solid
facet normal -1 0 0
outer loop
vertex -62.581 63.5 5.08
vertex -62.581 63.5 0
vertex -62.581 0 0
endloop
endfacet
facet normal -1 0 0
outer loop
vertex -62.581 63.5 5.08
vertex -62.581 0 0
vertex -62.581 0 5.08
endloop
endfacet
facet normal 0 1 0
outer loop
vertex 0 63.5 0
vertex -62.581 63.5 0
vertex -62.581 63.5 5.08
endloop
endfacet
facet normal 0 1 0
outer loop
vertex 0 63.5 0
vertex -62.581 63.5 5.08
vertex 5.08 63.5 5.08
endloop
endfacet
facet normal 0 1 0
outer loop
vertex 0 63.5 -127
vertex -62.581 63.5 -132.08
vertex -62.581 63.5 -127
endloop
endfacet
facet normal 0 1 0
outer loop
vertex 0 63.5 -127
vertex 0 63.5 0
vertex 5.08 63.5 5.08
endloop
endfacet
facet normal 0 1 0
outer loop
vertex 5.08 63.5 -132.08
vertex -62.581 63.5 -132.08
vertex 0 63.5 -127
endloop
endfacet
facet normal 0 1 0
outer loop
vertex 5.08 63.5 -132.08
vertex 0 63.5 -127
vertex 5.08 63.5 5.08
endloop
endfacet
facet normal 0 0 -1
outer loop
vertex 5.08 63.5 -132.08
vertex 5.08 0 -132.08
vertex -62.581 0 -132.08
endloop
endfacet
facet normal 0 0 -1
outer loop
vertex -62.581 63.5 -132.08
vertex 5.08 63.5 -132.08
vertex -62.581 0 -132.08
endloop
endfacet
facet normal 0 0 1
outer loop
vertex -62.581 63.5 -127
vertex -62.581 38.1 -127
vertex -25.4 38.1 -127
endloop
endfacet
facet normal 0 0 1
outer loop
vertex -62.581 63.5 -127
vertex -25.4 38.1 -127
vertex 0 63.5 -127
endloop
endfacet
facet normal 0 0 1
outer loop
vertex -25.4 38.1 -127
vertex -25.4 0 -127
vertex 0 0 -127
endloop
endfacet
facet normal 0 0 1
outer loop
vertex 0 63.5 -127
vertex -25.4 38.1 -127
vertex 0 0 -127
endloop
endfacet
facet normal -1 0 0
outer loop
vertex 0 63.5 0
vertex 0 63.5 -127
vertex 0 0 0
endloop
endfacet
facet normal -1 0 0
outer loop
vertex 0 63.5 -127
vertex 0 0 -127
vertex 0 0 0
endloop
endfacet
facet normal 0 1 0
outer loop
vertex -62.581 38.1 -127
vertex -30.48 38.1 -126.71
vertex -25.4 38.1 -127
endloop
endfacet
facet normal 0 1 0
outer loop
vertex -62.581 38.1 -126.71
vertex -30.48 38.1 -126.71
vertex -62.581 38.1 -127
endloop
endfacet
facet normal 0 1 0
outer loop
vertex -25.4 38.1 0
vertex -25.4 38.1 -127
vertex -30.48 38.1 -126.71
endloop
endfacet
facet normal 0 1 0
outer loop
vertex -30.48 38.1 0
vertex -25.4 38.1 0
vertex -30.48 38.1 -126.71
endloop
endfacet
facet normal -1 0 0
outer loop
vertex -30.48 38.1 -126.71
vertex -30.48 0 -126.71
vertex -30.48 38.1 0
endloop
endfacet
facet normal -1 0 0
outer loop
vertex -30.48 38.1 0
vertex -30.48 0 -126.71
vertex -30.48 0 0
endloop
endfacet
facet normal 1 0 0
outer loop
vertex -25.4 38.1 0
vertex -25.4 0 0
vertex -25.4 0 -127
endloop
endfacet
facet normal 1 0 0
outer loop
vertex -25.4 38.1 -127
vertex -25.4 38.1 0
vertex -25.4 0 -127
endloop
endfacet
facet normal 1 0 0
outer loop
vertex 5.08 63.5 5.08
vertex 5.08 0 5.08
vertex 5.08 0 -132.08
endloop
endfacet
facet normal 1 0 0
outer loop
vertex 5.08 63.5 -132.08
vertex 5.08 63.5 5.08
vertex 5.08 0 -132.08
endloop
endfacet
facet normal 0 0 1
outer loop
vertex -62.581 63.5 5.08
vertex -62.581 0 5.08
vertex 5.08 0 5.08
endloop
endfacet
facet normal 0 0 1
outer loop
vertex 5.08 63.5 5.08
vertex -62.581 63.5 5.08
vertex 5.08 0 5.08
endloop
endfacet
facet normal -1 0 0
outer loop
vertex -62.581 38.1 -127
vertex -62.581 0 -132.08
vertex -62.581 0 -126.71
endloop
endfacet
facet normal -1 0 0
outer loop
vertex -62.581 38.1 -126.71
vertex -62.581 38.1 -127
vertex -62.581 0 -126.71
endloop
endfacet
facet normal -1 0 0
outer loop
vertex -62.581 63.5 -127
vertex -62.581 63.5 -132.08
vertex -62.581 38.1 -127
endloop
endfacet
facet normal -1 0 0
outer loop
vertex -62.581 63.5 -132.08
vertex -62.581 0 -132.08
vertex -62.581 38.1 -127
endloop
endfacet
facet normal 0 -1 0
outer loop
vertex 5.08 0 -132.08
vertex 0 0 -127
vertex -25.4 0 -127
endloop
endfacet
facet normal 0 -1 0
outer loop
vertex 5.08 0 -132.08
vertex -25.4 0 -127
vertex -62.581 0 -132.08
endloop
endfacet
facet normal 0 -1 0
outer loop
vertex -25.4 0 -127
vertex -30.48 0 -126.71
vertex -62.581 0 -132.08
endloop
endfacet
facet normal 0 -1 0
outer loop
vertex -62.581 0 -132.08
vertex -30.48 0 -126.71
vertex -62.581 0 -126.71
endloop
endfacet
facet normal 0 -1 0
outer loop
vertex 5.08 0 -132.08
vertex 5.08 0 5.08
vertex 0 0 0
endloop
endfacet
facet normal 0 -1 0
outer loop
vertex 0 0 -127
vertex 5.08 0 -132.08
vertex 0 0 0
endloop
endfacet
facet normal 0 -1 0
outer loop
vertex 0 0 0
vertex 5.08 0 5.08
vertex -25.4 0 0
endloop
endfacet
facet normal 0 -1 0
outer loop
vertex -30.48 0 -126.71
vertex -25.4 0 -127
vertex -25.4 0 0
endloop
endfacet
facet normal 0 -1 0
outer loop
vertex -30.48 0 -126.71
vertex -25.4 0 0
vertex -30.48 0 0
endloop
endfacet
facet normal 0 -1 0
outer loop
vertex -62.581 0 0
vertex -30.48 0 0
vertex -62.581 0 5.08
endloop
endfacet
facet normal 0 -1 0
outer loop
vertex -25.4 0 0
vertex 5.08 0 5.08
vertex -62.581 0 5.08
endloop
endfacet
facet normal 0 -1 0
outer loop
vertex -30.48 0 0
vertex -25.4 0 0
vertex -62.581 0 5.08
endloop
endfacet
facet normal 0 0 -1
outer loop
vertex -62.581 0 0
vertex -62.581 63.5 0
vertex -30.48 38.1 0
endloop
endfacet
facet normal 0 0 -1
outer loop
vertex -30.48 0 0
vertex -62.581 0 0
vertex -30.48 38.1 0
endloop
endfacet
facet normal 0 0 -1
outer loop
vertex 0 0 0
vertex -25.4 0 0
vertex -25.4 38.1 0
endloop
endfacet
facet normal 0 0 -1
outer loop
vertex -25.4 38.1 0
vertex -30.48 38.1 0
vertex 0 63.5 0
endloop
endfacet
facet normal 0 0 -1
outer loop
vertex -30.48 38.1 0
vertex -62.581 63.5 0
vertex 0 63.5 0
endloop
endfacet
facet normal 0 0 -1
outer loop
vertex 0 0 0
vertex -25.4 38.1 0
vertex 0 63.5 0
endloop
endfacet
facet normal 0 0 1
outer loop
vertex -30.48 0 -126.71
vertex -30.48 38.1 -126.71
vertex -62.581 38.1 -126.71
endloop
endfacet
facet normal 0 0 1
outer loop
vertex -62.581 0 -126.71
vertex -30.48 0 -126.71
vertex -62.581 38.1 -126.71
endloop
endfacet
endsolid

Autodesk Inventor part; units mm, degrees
ref_plane "YZ Plane" through (0, 0, 0) normal (1, 0, 0) x (0, 1, 0)
ref_plane "XZ Plane" through (0, 0, 0) normal (0, 1, 0) x (-1, 0, 0)
ref_plane "XY Plane" through (0, 0, 0) normal (0, 0, 1) x (1, 0, 0)
sketch "Sketch1" plane through (0, 0, 0) normal (0, 1, 0) x (-1, 0, 0)
  line L0 (0, 0) -> (25.4, 0)
  line L1 (25.4, 0) -> (25.4, -127)
  line L2 (25.4, -127) -> (0, -127)
  line L3 (0, -127) -> (0, 0)
  line L4 (30.48, 5.08) -> (-5.08, 5.08)
  line L5 (-5.08, 5.08) -> (-5.08, -132.08)
  line L6 (-5.08, -132.08) -> (30.48, -132.08)
  line L7 (30.48, -132.08) -> (30.48, 5.08)
  dimension "d0" = 25.4
  dimension "d1" = 127
  dimension "d2" = 5.08
  dimension "d3" = 5.08
  dimension "d4" = 5.08
  dimension "d5" = 5.08
extrude "Extrusion1" add sketch "Sketch1" along normal blind 38.1
sketch "Sketch2" plane through (0, 38.1, 0) normal (0, 1, 0) x (1, 0, 0)
  line L0 (-30.48, -5.08) -> (5.08, -5.08) projected
  line L1 (5.08, -5.08) -> (-62.5812, -5.08)
  line L2 (-62.5812, -5.08) -> (-62.5812, 0)
  line L3 (-62.5812, 0) -> (0, 0)
  line L4 (-25.4, 127) -> (0, 127) projected
  line L5 (0, 127) -> (-62.5812, 127)
  line L6 (5.08, -5.08) -> (5.08, 132.08) projected
  line L7 (5.08, -5.08) -> (-62.5812, -5.08)
  line L8 (-62.5812, 132.08) -> (5.08, 132.08)
  line L9 (5.08, 132.08) -> (5.08, -5.08)
  line L10 (-62.5812, 132.08) -> (-47.0844, 132.08)
  line L11 (-62.5812, 127) -> (-62.5812, 132.08)
  line L12 (0, 127) -> (0, 0) projected
  line L13 (0, 0) -> (0, 127)
  line L14 (0, 127) -> (-62.5812, 127)
  line L15 (-62.5812, 132.08) -> (3.2473, 132.08)
  line L16 (5.08, 132.08) -> (-30.48, 132.08) projected
extrude "Extrusion2" add sketch "Sketch2" along normal blind 25.4
sketch "Sketch5" plane through (0, 38.1, 0) normal (0, -1, 0) x (1, 0, 0)
  line L0 (-62.5812, -132.08) -> (-62.5812, -127) projected
  line L1 (-30.48, -132.08) -> (-30.48, 5.08) projected
  line L2 (-62.5812, -132.08) -> (-30.48, -132.08)
  line L3 (-30.48, -132.08) -> (-30.48, -126.7104)
  line L4 (-30.48, -126.7104) -> (-62.5812, -126.7104)
  line L5 (-62.5812, -126.7104) -> (-62.5812, -132.08)
  line L6 (-62.5812, 0) -> (-62.5812, 5.08) projected
  line L7 (-30.48, 5.08) -> (5.08, 5.08) projected
  line L8 (-62.5812, 0) -> (-30.48, 0)
  line L9 (-30.48, 0) -> (-30.48, 5.08)
  line L10 (-30.48, 5.08) -> (-62.5812, 5.08)
  line L11 (-62.5812, 5.08) -> (-62.5812, 0)
  point P0 (0, 0)
extrude "Extrusion3" add sketch "Sketch5" along normal blind 38.1
properties part number "Base2"
